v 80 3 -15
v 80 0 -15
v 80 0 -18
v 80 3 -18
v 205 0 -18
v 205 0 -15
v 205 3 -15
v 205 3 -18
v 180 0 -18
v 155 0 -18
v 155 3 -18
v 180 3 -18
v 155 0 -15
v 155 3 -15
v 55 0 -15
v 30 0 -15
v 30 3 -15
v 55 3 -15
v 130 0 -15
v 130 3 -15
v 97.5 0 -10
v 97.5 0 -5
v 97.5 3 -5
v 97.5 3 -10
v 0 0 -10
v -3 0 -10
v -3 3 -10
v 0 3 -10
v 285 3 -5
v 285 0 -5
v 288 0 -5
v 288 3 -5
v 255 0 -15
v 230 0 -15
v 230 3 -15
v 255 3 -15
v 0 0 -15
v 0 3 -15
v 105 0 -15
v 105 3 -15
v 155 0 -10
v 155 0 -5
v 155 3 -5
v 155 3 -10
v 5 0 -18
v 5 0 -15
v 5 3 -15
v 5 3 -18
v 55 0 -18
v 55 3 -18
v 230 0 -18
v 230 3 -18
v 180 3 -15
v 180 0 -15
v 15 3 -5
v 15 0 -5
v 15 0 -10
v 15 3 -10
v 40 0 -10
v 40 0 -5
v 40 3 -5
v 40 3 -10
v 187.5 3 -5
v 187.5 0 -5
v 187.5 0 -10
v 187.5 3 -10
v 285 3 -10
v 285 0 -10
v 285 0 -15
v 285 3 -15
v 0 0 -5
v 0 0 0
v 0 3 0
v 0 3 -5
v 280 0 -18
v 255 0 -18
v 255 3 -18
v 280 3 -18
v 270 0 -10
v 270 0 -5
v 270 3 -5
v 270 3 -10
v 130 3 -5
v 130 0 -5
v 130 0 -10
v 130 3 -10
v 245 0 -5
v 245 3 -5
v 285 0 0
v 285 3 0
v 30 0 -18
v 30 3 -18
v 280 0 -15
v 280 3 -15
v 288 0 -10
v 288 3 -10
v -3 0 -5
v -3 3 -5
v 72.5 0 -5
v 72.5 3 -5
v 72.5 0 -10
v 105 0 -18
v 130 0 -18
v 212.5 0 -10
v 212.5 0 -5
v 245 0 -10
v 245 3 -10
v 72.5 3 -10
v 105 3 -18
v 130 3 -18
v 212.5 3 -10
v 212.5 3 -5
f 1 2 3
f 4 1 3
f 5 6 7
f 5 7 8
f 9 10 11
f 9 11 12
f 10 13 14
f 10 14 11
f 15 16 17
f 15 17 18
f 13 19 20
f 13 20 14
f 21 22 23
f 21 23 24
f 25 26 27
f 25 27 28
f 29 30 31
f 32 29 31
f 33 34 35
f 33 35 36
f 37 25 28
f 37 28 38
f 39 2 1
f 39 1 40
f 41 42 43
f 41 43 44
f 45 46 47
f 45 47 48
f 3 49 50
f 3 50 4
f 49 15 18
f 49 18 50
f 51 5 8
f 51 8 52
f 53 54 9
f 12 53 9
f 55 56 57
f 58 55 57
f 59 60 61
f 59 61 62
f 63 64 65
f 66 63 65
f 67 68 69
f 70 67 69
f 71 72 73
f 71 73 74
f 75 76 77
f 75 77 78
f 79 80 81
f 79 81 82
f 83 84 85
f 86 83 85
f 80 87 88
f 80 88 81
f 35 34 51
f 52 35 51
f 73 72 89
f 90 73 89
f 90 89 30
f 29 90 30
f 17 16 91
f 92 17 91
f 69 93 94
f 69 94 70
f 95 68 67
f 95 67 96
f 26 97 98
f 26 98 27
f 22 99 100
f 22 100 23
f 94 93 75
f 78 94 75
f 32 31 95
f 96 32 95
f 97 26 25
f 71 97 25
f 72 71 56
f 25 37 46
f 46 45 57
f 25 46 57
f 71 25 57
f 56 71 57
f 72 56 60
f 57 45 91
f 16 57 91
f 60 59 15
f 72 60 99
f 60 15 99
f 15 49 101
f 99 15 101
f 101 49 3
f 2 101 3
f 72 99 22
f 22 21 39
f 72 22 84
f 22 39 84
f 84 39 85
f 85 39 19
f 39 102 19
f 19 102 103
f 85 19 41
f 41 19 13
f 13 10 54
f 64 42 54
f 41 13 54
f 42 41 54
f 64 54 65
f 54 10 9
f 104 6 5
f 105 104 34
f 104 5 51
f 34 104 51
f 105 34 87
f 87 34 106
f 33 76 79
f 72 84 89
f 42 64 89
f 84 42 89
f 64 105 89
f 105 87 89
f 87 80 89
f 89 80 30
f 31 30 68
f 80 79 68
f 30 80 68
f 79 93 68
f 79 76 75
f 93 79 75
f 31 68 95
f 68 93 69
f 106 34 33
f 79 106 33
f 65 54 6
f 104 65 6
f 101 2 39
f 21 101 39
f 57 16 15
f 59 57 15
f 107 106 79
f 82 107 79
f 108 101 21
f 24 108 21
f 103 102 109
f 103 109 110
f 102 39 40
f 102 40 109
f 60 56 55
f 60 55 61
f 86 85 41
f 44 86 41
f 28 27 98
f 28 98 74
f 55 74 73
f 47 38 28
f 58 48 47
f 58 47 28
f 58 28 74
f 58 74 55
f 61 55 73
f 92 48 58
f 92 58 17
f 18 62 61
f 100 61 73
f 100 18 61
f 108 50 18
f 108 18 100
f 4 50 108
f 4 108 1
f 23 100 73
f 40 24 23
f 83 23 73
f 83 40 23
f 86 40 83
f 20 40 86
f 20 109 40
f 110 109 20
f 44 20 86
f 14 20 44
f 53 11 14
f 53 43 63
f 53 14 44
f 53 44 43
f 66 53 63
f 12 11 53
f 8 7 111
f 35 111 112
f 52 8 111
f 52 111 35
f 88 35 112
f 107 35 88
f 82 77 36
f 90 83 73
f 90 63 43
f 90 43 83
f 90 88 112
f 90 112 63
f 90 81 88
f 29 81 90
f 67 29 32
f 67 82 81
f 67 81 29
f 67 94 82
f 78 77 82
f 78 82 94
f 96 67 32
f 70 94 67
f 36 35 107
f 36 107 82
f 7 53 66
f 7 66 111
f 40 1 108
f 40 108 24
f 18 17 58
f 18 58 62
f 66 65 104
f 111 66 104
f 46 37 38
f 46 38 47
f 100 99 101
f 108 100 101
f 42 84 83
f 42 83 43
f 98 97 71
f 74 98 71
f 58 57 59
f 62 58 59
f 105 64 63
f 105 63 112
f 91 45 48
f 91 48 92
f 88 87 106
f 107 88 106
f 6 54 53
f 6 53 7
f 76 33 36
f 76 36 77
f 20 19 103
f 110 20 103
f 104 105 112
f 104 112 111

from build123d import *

# Parameters (mm, degrees)
SKICA1_W                 = 285
SKICA1_H                 = 15
P_IDAT_VYSUNUT_M1_DEPTH  = 3
SKICA2_W                 = 25
SKICA2_H                 = 3
SKICA2_W_2               = 3
SKICA2_H_2               = 5
P_IDAT_VYSUNUT_M2_DEPTH  = 3
SKICA3_W                 = 25
SKICA3_H                 = 5
ODEBRAT_VYSUNUT_M1_DEPTH = 289.577545904


with BuildPart() as part:
    # Skica1 → Přidat vysunutím1 (new body)
    with BuildSketch(Plane(origin=(0, 0, 0), x_dir=(1, 0, 0), z_dir=(0, 1, 0))):
        with Locations((142.5, 7.5)):
            Rectangle(SKICA1_W, SKICA1_H)
    extrude(amount=P_IDAT_VYSUNUT_M1_DEPTH)

    # Skica2 → Přidat vysunutím2 (add)
    with BuildSketch(Plane(origin=(0, 0, 0), x_dir=(1, 0, 0), z_dir=(0, 1, 0))):
        with Locations((67.5, 16.5)):
            Rectangle(SKICA2_W, SKICA2_H)
        with Locations((-1.5, 7.5)):
            Rectangle(SKICA2_W_2, SKICA2_H_2)
        with Locations((17.5, 16.5)):
            Rectangle(SKICA2_W, SKICA2_H)
        with Locations((117.5, 16.5)):
            Rectangle(SKICA2_W, SKICA2_H)
        with Locations((167.5, 16.5)):
            Rectangle(SKICA2_W, SKICA2_H)
        with Locations((286.5, 7.5)):
            Rectangle(SKICA2_W_2, SKICA2_H_2)
        with Locations((217.5, 16.5)):
            Rectangle(SKICA2_W, SKICA2_H)
        with Locations((267.5, 16.5)):
            Rectangle(SKICA2_W, SKICA2_H)
    extrude(amount=P_IDAT_VYSUNUT_M2_DEPTH)

    # Skica3 → Odebrat vysunutím1 (cut, through all)
    with BuildSketch(Plane(origin=(0, 0, 0), x_dir=(1, 0, 0), z_dir=(0, 1, 0))):
        with Locations((27.5, 7.5)):
            Rectangle(SKICA3_W, SKICA3_H)
        with Locations((85, 7.5)):
            Rectangle(SKICA3_W, SKICA3_H)
        with Locations((142.5, 7.5)):
            Rectangle(SKICA3_W, SKICA3_H)
        with Locations((200, 7.5)):
            Rectangle(SKICA3_W, SKICA3_H)
        with Locations((257.5, 7.5)):
            Rectangle(SKICA3_W, SKICA3_H)
    extrude(amount=ODEBRAT_VYSUNUT_M1_DEPTH, mode=Mode.SUBTRACT)


solid = part.part
